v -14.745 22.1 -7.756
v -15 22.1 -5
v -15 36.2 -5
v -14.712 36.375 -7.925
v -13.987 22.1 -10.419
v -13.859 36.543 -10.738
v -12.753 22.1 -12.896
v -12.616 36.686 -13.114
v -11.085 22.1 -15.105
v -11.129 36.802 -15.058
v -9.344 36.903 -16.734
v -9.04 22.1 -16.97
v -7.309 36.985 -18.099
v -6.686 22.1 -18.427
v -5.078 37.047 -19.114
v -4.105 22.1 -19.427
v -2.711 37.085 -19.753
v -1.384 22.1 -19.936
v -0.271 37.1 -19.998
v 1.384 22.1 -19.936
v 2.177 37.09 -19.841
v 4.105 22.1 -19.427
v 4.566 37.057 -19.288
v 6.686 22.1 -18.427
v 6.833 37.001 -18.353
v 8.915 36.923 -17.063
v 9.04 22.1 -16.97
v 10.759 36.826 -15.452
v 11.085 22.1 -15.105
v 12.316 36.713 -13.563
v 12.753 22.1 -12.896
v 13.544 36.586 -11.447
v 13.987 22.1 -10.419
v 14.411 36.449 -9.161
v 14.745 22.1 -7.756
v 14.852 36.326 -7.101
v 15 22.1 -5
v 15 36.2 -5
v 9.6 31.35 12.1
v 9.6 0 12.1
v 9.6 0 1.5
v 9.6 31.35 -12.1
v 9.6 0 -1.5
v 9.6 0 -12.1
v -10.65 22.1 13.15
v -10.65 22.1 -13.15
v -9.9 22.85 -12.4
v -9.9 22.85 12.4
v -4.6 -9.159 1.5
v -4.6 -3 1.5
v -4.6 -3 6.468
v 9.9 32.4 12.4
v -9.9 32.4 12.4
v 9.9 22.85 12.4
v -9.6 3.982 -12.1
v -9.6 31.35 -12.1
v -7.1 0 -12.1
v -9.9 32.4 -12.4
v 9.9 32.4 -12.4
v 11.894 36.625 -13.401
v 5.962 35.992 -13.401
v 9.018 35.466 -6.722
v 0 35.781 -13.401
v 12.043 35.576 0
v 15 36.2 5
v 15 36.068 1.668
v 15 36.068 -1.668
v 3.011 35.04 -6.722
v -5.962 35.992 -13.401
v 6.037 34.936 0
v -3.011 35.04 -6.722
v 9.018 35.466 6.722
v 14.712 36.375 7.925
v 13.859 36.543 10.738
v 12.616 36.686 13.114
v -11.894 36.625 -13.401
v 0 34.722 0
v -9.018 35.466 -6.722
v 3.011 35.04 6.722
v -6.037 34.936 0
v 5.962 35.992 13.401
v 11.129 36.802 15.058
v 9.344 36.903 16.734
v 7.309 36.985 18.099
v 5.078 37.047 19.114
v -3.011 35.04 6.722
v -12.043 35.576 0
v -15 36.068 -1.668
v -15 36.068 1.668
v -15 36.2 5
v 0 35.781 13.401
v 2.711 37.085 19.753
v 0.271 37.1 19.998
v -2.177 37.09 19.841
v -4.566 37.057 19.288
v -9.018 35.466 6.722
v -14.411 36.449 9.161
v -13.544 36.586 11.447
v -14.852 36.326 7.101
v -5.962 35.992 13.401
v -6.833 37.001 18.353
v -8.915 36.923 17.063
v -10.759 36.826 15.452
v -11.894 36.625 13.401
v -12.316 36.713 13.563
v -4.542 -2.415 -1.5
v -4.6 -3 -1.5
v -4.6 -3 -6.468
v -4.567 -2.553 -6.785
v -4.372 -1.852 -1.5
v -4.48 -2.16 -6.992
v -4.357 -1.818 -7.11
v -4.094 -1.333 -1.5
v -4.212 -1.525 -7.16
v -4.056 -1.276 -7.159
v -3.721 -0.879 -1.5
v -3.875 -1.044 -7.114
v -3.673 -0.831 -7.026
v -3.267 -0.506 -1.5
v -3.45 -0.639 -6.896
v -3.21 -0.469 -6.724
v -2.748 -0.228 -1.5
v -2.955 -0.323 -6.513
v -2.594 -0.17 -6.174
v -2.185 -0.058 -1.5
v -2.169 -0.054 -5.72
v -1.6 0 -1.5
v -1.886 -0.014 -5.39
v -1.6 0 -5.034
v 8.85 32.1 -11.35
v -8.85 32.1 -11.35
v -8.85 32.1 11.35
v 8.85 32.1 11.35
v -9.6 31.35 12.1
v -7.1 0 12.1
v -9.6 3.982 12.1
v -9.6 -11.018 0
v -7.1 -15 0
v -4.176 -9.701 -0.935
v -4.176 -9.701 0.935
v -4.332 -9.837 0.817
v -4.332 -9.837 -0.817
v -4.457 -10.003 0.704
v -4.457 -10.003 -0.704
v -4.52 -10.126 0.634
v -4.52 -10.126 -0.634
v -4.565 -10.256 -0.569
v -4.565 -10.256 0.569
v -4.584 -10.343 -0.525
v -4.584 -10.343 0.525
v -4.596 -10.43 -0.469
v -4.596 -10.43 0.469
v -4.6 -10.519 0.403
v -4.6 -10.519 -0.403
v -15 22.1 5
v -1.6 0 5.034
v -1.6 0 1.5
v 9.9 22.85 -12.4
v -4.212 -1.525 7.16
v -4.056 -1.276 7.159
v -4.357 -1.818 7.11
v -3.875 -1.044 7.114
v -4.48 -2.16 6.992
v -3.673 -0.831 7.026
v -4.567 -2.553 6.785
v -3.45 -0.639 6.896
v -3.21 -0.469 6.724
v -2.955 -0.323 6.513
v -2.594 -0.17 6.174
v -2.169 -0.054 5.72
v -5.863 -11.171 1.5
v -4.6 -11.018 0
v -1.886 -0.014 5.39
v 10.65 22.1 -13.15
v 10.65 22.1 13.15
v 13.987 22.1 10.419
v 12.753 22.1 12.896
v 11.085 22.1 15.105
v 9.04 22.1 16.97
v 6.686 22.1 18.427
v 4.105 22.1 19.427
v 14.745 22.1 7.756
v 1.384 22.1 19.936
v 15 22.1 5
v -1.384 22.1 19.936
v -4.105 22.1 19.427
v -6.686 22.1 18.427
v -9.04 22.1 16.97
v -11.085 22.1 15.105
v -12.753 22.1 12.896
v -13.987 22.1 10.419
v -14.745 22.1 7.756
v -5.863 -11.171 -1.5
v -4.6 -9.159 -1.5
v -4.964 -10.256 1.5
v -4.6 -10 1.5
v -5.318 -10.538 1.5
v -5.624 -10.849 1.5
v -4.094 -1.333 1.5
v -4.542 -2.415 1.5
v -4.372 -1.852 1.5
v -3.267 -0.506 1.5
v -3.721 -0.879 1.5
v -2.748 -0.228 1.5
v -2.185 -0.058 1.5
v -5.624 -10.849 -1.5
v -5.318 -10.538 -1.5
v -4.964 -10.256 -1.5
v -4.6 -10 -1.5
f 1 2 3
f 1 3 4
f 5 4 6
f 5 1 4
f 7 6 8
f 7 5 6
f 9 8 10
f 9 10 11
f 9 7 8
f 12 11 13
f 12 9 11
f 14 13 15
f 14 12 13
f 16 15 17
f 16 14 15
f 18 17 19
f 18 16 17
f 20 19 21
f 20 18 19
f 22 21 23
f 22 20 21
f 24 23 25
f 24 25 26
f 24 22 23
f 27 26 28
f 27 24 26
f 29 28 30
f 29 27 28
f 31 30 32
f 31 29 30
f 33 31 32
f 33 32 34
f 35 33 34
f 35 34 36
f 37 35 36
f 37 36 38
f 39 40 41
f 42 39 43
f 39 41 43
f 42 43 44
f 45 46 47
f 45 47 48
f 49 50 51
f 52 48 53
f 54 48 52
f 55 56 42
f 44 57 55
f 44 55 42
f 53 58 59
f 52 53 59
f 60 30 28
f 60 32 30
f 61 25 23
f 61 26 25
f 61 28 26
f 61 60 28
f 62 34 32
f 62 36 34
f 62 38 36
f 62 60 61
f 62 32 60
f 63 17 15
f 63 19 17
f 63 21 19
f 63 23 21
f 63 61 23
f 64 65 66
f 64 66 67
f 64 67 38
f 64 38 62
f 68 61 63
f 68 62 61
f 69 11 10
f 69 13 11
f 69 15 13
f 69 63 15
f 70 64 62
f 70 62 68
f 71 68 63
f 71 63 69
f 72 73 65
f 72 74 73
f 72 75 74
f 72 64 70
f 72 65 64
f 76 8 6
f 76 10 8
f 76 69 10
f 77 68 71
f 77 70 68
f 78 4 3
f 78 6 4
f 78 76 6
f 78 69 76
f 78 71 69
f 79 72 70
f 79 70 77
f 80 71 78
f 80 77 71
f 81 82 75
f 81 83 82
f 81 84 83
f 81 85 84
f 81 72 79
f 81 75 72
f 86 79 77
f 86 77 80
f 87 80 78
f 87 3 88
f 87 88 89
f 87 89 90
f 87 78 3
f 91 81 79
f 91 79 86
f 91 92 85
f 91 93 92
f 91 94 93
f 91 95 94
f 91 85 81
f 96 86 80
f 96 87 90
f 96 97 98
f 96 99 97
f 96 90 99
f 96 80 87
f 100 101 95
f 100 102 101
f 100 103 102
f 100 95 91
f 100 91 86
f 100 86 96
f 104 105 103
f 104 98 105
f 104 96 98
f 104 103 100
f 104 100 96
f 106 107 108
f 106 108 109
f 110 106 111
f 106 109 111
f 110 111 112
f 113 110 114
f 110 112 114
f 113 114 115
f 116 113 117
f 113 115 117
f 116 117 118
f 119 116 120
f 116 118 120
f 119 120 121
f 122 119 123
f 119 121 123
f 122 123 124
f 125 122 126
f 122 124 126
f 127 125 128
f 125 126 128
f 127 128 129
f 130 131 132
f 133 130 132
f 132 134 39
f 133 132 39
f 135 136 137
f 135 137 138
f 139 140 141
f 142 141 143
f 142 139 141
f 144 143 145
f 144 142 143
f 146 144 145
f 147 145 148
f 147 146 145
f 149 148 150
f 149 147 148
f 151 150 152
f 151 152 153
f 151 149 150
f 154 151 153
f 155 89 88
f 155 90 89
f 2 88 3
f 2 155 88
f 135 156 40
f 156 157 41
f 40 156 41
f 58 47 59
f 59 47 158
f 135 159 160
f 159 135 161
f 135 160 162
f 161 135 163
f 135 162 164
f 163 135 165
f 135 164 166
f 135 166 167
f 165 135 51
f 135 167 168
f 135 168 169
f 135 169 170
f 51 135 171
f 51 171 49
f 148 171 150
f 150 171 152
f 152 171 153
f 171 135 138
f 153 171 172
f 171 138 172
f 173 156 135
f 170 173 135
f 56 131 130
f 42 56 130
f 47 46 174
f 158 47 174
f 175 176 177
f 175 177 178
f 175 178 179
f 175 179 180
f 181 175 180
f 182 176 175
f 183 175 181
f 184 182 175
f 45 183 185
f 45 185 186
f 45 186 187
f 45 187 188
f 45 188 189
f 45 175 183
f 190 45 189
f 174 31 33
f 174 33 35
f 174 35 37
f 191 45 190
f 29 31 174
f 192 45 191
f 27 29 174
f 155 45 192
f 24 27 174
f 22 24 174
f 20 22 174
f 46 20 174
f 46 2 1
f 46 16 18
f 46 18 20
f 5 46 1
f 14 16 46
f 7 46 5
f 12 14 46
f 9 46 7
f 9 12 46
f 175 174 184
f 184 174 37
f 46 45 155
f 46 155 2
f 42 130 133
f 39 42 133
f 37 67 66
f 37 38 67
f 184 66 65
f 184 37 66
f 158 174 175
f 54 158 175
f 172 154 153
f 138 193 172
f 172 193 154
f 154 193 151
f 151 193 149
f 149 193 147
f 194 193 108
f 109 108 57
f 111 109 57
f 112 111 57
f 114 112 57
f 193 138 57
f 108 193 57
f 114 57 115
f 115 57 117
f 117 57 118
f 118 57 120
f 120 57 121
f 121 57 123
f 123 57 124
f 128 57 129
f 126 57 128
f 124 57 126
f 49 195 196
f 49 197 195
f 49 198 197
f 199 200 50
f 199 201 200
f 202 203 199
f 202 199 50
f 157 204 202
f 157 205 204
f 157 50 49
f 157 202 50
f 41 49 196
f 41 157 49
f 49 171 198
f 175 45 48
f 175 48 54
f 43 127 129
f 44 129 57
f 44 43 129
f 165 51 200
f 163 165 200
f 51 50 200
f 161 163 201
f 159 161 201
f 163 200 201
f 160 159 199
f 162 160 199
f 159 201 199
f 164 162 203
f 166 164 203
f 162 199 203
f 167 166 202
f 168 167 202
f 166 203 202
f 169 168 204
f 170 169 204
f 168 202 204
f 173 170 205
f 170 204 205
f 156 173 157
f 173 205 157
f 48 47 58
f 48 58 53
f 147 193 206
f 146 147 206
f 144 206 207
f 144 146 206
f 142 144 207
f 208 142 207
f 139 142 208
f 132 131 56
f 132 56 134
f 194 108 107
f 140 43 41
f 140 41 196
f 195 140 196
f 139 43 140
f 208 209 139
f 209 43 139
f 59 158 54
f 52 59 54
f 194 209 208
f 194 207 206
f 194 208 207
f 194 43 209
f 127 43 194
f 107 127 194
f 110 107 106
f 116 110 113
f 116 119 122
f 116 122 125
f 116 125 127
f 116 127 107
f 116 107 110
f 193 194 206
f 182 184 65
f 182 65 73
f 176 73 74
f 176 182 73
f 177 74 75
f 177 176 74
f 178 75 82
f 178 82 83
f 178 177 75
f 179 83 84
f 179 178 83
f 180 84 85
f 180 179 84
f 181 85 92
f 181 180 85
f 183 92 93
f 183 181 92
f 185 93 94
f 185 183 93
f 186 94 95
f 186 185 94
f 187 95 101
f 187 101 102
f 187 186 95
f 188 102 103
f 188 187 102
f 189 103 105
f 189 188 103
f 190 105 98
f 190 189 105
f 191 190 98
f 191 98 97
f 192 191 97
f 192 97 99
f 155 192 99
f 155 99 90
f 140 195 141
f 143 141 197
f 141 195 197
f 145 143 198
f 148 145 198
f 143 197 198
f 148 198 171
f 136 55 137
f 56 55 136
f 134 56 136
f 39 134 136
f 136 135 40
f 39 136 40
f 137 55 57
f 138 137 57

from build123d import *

# Parameters (mm, degrees)
SKETCH1_W               = 19.2
SKETCH1_H               = 24.2
BOSS_EXTRUDE1_DEPTH     = 22.1
BOSS_EXTRUDE2_DEPTH     = 15
BOSS_EXTRUDE3_DEPTH     = 5
BOSS_EXTRUDE4_DEPTH     = 1.5
CHAMFER1_SIZE           = 2.5
FILLET1_R               = 3
SKETCH9_W               = 19.8
SKETCH9_H               = 24.8
SKETCH9_W_2             = 19.2
SKETCH9_H_2             = 24.2
CUT_EXTRUDE_THIN1_DEPTH = 10
SKETCH10_W              = 24.8
SKETCH10_H              = 0.3
CUT_EXTRUDE1_DEPTH      = 19.2
SKETCH12_W              = 19.8
SKETCH12_H              = 24.8
CUT_EXTRUDE3_DEPTH      = 0.3
CHAMFER2_SIZE           = 0.75
CHAMFER3_SIZE           = 0.75
FILLET2_R               = 1


with BuildPart() as part:
    # Sketch1 → Boss-Extrude1 (new body)
    with BuildSketch(Plane(origin=(0, 0, 0), x_dir=(1, 0, 0), z_dir=(0, 1, 0))):
        Rectangle(SKETCH1_W, SKETCH1_H)
    extrude(amount=BOSS_EXTRUDE1_DEPTH)

    # Sketch2 → Boss-Extrude2 (add)
    with BuildSketch(Plane(origin=(0, 22.1, 0), x_dir=(1, 0, 0), z_dir=(0, 1, 0))):
        with BuildLine():
            Line((15, 5), (15, -5))
            ThreePointArc((15, -5), (0, -20), (-15, -5))
            Line((-15, -5), (-15, 5))
            ThreePointArc((-15, 5), (0, 20), (15, 5))
        make_face()
    extrude(amount=BOSS_EXTRUDE2_DEPTH)

    # Sketch4 → Boss-Extrude3 (add)
    with BuildSketch(Plane.ZY.offset(9.6)):
        Polygon((-12.1, 0), (0, -15), (12.1, 0), align=None)
    extrude(amount=-BOSS_EXTRUDE3_DEPTH)

    # Sketch6 → Boss-Extrude4 (add, symmetric)
    with BuildSketch(Plane.XY):
        Polygon((-4.6, -10), (9.6, 0), (-4.6, 0), align=None)
    extrude(amount=BOSS_EXTRUDE4_DEPTH, both=True)

    # Chamfer1
    # the kernel refuses this chamfer: 2.5 mm, written as the material it takes off along each edge
    with BuildSketch(Plane(origin=(-9.6, 5.004053029, -16.136602777), x_dir=(-0.02749587661058631, 0.6276164868252809, 0.7780369671387777), z_dir=(0, -0.7783312410184162, 0.6278538677548561)), Plane(origin=(-9.6, -20.004053029, -4.036602777), x_dir=(-0.027495876610586317, 0.6276164868252805, -0.778036967138778), z_dir=(0, 0.7783312410184164, 0.6278538677548556))) as chamfer1_piece_1:
        Polygon((CHAMFER1_SIZE * 0.999621916911, -CHAMFER1_SIZE * 0.0274958766106), (-CHAMFER1_SIZE * 0.0274958766106, -CHAMFER1_SIZE * 0.999621916911), (0, 0), align=None)
    extrude(amount=32.130415355, mode=Mode.SUBTRACT)
    with BuildSketch(Plane(origin=(-4.6, 5.004053029, -16.136602777), x_dir=(-0.9996219169112968, -0.017263392477266982, -0.02140089976520685), z_dir=(0, -0.7783312410184162, 0.6278538677548561))) as chamfer1_piece_2_section:
        Polygon((CHAMFER1_SIZE * 0.999621916911, -CHAMFER1_SIZE * 0.0274958766106), (-CHAMFER1_SIZE * 0.0274958766106, -CHAMFER1_SIZE * 0.999621916911), (0, 0), align=None)
    chamfer1_piece_2 = extrude(amount=32.130415355, mode=Mode.PRIVATE)
    chamfer1_piece_2 = split(chamfer1_piece_2, bisect_by=Plane(origin=(-5.457746671, 0, -6.779130054), z_dir=(0, -1, 0)), keep=Keep.TOP, mode=Mode.PRIVATE)
    chamfer1_piece_2 = split(chamfer1_piece_2, bisect_by=Plane(origin=(-5.457746671, -5.291671114, -1.5), z_dir=(0, 0, -1)), keep=Keep.TOP, mode=Mode.PRIVATE)
    add(chamfer1_piece_2, mode=Mode.SUBTRACT)
    with BuildSketch(Plane(origin=(-4.6, 5.004053029, -16.136602777), x_dir=(-0.9996219169112968, -0.017263392477266982, -0.02140089976520685), z_dir=(0, -0.7783312410184162, 0.6278538677548561))) as chamfer1_piece_3_section:
        Polygon((CHAMFER1_SIZE * 0.999621916911, -CHAMFER1_SIZE * 0.0274958766106), (-CHAMFER1_SIZE * 0.0274958766106, -CHAMFER1_SIZE * 0.999621916911), (0, 0), align=None)
    chamfer1_piece_3 = extrude(amount=32.130415355, mode=Mode.PRIVATE)
    chamfer1_piece_3 = split(chamfer1_piece_3, bisect_by=Plane(origin=(-6.522169722, -11.35364065, -0.439205928), z_dir=(0.5757786192909291, -0.8176056393931194, 0)), keep=Keep.TOP, mode=Mode.PRIVATE)
    add(chamfer1_piece_3, mode=Mode.SUBTRACT)
    with BuildSketch(Plane(origin=(-4.6, -20.004053029, -4.036602777), x_dir=(-0.9996219169112968, -0.017263392477266715, 0.021400899765206826), z_dir=(0, 0.7783312410184164, 0.6278538677548556))) as chamfer1_piece_4_section:
        Polygon((CHAMFER1_SIZE * 0.999621916911, -CHAMFER1_SIZE * 0.0274958766106), (-CHAMFER1_SIZE * 0.0274958766106, -CHAMFER1_SIZE * 0.999621916911), (0, 0), align=None)
    chamfer1_piece_4 = extrude(amount=32.130415355, mode=Mode.PRIVATE)
    chamfer1_piece_4 = split(chamfer1_piece_4, bisect_by=Plane(origin=(-6.522169722, -11.35364065, 0.439205928), z_dir=(0.5757786192909291, -0.8176056393931194, 0)), keep=Keep.TOP, mode=Mode.PRIVATE)
    add(chamfer1_piece_4, mode=Mode.SUBTRACT)
    with BuildSketch(Plane(origin=(-4.6, -20.004053029, -4.036602777), x_dir=(-0.9996219169112968, -0.017263392477266715, 0.021400899765206826), z_dir=(0, 0.7783312410184164, 0.6278538677548556))) as chamfer1_piece_5_section:
        Polygon((CHAMFER1_SIZE * 0.999621916911, -CHAMFER1_SIZE * 0.0274958766106), (-CHAMFER1_SIZE * 0.0274958766106, -CHAMFER1_SIZE * 0.999621916911), (0, 0), align=None)
    chamfer1_piece_5 = extrude(amount=32.130415355, mode=Mode.PRIVATE)
    chamfer1_piece_5 = split(chamfer1_piece_5, bisect_by=Plane(origin=(-5.457746671, 0, 6.779130054), z_dir=(0, -1, 0)), keep=Keep.TOP, mode=Mode.PRIVATE)
    chamfer1_piece_5 = split(chamfer1_piece_5, bisect_by=Plane(origin=(-5.457746671, -5.291671114, 1.5), z_dir=(0, 0, 1)), keep=Keep.TOP, mode=Mode.PRIVATE)
    add(chamfer1_piece_5, mode=Mode.SUBTRACT)

    # Fillet1
    fillet1_edges = [part.edges().sort_by_distance(p)[0] for p in [
        (-4.6, 0, -5.193999965),
        (-4.6, 0, 5.193999965),
    ]]
    fillet(fillet1_edges, radius=FILLET1_R)

    # Sketch8 → Cut-Revolve3 (revolve, cut)
    with BuildSketch(Plane(origin=(0, 0, 0), x_dir=(0, 0, -1), z_dir=(1, 0, 0))):
        with BuildLine():
            Line((-85.278426346, 120), (85.278426346, 120))
            ThreePointArc((85.278426346, 120), (0, 34.721573654), (-85.278426346, 120))
        make_face()
    revolve(axis=Axis((0, 120, 85.278426346), (0, 0, -1)), mode=Mode.SUBTRACT)

    # Sketch9 → Cut-Extrude-Thin1 (cut)
    with BuildSketch(Plane.XZ.offset(-22.1)):
        Rectangle(SKETCH9_W, SKETCH9_H)
        Rectangle(SKETCH9_W_2, SKETCH9_H_2, mode=Mode.SUBTRACT)
    extrude(amount=-CUT_EXTRUDE_THIN1_DEPTH, mode=Mode.SUBTRACT)

    # Sketch10 → Cut-Extrude1 (cut)
    with BuildSketch(Plane.ZY.offset(9.6)):
        with Locations((0, 32.25)):
            Rectangle(SKETCH10_W, SKETCH10_H)
    extrude(amount=-CUT_EXTRUDE1_DEPTH, mode=Mode.SUBTRACT)


with BuildPart() as cut_extrude1_piece_1:
    # of the separate pieces the step leaves, piece 1, a body of its own (cut_extrude1_pieces)
    add(part.part.solids().sort_by_distance((-4.6, -3, -6.467999931))[0])

    # Chamfer3
    chamfer3_edges = [cut_extrude1_piece_1.edges().sort_by_distance(p)[0] for p in [
        (0, 32.1, -12.1),
        (9.6, 32.1, 0),
        (0, 32.1, 12.1),
        (-9.6, 32.1, 0),
    ]]
    chamfer(chamfer3_edges, length=CHAMFER3_SIZE)

    # Fillet2
    fillet2_edges = [cut_extrude1_piece_1.edges().sort_by_distance(p)[0] for p in [
        (-4.6, -10, 0),
        (-5.073449943, -10.333415453, -1.160666632),
        (-5.073449943, -10.333415453, 1.160666632),
    ]]
    fillet(fillet2_edges, radius=FILLET2_R)


with BuildPart() as cut_extrude1_piece_2:
    # of the separate pieces the step leaves, piece 2, a body of its own (cut_extrude1_pieces)
    add(part.part.solids().sort_by_distance((9.9, 32.1, 12.4))[0])

    # Sketch12 → Cut-Extrude3 (cut)
    with BuildSketch(Plane.XZ.offset(-32.1)):
        Rectangle(SKETCH12_W, SKETCH12_H)
    extrude(amount=-CUT_EXTRUDE3_DEPTH, mode=Mode.SUBTRACT)

    # Chamfer2
    chamfer2_edges = [cut_extrude1_piece_2.edges().sort_by_distance(p)[0] for p in [
        (9.9, 22.1, 0),
        (0, 22.1, -12.4),
        (-9.9, 22.1, 0),
        (0, 22.1, 12.4),
    ]]
    chamfer(chamfer2_edges, length=CHAMFER2_SIZE)


solid = Compound([cut_extrude1_piece_1.part, cut_extrude1_piece_2.part])
